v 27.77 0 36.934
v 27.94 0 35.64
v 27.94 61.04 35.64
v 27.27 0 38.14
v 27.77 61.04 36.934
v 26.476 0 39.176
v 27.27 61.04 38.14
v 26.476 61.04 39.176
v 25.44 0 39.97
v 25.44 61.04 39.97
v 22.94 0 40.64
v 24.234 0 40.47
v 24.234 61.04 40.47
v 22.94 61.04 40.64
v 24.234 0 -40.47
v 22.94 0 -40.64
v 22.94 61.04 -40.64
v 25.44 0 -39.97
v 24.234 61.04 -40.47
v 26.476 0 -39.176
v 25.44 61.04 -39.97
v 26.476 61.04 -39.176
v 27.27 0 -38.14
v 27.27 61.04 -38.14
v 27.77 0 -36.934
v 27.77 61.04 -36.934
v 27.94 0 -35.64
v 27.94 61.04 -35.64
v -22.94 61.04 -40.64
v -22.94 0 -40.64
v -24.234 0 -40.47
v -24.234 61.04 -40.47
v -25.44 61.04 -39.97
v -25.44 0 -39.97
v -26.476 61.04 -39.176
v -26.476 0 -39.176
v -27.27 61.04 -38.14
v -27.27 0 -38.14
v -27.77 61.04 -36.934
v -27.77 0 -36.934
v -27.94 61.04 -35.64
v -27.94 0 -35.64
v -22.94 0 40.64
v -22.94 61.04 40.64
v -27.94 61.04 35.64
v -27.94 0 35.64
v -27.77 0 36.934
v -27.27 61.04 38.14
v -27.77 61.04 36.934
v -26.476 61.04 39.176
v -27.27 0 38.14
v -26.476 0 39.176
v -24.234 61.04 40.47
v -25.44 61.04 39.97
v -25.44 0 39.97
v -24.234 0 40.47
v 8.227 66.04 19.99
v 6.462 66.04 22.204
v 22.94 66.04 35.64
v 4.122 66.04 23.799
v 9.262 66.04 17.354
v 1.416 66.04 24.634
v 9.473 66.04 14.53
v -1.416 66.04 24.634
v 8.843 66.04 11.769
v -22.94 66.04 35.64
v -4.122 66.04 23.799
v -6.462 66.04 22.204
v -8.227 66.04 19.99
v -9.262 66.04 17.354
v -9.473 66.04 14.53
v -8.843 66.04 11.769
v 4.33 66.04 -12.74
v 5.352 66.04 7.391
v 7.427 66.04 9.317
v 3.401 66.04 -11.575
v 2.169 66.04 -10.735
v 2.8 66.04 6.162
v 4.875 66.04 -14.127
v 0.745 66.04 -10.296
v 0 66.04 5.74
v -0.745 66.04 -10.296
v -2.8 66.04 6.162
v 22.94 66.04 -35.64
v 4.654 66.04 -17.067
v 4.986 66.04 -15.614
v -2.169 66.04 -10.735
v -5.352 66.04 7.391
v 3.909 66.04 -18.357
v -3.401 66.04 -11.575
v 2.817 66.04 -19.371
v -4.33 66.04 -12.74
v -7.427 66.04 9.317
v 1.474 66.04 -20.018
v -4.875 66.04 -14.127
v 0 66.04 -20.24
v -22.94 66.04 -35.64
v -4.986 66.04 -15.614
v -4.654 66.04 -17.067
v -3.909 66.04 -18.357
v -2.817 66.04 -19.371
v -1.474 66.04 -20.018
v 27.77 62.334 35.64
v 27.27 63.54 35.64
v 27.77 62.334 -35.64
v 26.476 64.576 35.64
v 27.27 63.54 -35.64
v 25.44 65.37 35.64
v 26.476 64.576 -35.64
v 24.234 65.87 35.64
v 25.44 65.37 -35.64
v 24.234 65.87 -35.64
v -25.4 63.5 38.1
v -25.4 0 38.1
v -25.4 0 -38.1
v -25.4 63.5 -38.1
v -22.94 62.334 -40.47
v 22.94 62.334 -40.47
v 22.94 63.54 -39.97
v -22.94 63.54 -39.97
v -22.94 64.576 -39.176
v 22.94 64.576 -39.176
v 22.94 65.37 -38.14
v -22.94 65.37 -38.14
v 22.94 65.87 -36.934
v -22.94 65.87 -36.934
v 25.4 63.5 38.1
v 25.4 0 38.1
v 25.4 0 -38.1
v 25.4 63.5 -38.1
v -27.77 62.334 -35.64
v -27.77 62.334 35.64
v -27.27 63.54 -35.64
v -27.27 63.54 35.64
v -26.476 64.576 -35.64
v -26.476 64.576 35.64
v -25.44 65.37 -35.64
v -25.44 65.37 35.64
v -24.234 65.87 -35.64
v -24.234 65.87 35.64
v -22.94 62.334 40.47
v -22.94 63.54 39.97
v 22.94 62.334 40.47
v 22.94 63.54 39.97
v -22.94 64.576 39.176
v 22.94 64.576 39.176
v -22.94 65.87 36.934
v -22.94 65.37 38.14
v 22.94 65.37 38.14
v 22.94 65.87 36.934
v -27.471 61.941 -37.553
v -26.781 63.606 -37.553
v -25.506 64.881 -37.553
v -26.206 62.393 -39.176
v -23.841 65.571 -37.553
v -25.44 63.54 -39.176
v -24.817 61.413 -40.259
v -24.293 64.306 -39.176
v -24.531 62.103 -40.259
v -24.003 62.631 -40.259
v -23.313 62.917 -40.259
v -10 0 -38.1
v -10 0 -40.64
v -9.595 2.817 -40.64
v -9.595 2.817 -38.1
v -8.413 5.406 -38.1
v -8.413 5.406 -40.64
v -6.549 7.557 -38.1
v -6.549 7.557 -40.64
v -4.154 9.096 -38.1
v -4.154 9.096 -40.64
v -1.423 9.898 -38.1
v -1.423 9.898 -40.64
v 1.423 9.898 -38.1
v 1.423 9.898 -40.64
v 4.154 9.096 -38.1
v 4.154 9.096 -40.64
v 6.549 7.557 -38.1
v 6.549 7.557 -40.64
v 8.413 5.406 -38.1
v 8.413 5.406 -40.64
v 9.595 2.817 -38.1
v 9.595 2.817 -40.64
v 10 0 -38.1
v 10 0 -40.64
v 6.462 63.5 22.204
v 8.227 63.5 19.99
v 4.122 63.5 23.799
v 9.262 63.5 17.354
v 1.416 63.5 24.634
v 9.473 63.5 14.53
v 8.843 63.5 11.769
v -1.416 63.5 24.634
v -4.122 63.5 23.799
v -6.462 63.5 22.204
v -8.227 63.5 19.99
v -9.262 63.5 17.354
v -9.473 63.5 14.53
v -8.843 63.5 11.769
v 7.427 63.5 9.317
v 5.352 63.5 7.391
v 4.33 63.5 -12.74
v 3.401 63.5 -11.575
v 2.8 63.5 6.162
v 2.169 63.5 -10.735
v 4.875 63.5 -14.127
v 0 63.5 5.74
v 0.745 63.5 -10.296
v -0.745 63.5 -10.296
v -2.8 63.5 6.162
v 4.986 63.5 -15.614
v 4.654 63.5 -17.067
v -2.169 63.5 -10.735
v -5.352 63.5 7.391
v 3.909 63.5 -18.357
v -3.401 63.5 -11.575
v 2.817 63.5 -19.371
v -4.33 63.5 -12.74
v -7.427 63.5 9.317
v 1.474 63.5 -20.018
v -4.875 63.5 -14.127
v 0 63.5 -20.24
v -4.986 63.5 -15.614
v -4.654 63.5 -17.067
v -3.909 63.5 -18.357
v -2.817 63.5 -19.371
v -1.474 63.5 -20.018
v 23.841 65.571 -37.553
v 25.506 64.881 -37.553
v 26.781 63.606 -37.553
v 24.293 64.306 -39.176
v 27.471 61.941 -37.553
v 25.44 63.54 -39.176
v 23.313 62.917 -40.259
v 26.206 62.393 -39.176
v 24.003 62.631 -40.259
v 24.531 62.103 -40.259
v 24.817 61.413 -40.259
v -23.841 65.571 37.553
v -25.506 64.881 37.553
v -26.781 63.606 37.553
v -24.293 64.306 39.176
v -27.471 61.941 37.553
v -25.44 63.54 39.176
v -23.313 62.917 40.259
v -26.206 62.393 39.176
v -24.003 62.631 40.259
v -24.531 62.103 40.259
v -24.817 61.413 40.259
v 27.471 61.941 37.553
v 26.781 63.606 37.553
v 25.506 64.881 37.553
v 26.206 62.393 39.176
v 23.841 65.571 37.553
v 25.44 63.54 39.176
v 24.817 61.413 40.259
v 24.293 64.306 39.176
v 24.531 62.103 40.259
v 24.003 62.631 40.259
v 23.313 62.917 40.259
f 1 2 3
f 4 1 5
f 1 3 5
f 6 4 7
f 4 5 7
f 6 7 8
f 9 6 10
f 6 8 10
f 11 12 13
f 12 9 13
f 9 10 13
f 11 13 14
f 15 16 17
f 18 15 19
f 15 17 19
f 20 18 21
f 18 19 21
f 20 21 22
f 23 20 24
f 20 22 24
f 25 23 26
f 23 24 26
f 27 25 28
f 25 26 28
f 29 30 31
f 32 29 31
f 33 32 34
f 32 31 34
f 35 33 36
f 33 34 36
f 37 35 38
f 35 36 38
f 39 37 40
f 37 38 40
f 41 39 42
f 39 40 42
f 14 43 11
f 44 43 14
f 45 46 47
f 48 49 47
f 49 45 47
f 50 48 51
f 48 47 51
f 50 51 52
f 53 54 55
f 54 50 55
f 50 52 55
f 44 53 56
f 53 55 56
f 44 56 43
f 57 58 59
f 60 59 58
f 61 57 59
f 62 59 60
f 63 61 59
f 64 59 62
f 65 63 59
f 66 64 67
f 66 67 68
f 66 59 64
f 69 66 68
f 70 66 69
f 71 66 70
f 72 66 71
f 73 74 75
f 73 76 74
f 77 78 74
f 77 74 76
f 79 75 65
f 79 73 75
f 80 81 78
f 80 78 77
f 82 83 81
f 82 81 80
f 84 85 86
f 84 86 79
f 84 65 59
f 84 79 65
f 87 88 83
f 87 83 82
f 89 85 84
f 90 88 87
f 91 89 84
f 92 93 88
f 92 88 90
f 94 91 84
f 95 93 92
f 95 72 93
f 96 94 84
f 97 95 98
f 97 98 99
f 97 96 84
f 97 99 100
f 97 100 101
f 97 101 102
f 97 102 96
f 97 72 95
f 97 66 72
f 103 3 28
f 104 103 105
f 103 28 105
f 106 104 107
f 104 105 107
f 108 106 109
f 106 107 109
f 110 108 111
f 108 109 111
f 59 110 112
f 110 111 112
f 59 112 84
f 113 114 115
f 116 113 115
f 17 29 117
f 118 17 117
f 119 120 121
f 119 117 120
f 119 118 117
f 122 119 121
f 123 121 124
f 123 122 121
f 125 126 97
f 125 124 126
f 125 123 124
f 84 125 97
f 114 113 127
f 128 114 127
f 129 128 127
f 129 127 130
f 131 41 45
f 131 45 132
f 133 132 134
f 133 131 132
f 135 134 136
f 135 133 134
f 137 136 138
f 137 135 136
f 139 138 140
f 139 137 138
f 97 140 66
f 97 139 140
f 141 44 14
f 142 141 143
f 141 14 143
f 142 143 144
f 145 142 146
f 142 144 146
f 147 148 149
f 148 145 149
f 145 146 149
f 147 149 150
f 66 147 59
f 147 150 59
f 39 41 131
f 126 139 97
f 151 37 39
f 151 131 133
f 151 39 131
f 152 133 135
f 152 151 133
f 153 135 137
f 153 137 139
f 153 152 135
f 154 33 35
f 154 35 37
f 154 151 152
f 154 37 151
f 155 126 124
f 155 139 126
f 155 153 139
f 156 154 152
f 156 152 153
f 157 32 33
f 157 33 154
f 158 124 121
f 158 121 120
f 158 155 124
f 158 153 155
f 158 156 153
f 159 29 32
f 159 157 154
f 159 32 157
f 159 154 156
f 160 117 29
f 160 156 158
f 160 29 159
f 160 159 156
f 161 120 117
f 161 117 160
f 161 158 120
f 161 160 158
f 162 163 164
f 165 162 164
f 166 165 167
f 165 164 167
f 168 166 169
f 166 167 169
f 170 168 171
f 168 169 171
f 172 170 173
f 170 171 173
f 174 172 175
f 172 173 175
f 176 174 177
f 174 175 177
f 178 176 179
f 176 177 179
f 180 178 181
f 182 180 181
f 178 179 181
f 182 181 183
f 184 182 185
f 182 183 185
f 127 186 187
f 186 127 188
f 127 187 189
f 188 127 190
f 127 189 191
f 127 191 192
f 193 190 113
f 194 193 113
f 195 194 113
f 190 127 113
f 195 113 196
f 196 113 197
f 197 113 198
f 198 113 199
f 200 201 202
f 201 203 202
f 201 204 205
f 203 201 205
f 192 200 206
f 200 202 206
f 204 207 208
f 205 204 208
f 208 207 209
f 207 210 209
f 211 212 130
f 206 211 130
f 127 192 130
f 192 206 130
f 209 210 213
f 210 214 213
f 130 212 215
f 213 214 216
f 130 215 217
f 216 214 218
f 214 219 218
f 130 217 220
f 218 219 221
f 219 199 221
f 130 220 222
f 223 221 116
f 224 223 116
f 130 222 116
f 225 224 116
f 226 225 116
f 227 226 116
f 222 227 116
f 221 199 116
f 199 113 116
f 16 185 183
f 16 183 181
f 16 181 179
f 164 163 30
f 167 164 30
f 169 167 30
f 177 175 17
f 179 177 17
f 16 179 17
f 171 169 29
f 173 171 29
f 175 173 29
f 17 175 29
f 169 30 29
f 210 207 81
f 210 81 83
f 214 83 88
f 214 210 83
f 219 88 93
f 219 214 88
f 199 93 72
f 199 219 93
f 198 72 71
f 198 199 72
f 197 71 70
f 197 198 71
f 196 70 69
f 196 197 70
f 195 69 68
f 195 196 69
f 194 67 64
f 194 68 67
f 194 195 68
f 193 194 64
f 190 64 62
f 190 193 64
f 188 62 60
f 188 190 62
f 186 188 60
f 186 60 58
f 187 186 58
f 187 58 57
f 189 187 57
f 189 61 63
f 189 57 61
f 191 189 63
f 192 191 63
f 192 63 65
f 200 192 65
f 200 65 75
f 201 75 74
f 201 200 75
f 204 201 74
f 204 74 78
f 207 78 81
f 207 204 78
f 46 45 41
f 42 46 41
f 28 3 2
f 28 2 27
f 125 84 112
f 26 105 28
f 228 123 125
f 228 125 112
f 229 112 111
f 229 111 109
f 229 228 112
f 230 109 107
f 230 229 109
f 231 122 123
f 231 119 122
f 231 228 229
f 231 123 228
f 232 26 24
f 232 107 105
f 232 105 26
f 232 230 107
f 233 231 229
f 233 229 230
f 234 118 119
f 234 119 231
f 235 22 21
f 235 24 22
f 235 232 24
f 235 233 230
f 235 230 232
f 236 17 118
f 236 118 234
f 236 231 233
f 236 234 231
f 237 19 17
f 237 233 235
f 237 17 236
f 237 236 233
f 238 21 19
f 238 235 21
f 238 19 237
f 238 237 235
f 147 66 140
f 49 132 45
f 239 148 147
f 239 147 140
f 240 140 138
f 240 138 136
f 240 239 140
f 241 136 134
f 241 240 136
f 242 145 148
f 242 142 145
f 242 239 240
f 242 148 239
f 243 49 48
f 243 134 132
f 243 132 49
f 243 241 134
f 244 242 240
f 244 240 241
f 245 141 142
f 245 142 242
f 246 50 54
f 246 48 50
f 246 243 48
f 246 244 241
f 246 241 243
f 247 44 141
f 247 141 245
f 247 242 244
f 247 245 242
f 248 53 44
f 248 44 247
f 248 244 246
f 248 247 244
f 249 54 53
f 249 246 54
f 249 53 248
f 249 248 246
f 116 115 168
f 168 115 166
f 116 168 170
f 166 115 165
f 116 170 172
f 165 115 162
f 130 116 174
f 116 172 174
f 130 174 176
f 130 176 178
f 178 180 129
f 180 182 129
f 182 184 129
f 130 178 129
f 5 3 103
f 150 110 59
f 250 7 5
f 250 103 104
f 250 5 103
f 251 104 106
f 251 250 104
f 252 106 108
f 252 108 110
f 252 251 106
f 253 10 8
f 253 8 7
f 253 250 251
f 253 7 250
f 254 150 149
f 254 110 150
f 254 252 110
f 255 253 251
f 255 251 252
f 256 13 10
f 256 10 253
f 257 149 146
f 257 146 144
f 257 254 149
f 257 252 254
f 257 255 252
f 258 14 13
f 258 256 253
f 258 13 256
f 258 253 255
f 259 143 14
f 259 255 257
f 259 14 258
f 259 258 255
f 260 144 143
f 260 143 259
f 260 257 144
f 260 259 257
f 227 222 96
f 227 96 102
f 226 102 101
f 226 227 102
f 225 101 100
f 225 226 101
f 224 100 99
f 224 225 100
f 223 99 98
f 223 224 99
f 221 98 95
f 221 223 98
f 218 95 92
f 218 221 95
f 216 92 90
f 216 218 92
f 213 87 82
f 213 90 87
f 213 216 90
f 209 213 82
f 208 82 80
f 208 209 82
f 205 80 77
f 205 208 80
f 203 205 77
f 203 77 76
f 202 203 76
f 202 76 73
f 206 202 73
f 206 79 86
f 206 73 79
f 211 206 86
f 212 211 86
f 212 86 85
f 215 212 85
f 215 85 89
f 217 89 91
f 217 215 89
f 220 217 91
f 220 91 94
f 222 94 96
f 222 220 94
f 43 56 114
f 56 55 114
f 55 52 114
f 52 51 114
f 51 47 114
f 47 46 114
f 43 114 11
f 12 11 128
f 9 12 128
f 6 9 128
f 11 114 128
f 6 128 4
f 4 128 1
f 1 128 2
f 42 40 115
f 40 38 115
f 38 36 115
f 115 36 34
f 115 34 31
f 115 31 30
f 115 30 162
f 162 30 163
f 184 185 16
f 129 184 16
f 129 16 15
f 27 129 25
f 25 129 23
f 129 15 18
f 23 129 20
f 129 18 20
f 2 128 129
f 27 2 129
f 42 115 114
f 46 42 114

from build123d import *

# Parameters (mm, degrees)
SKETCH2_W                = 55.88
SKETCH2_H                = 81.28
SKETCH2_W_2              = 50.8
SKETCH2_H_2              = 76.2
BOSS_EXTRUDE1_DEPTH      = 63.5
BOSS_EXTRUDE2_DEPTH      = 27.94
BOSS_EXTRUDE2_DEPTH_BACK = 27.94
SKETCH3_W                = 81.28
SKETCH3_H                = 2.54
FILLET1_R                = 5
FILLET4_R                = 5
FILLET5_R                = 5
FILLET6_R                = 5
FILLET7_R                = 5
CUT_EXTRUDE1_REACH       = 84.423
SKETCH4_R                = 5
SKETCH4_R_2              = 9.5
CUT_EXTRUDE2_REACH       = 110.39
SKETCH6_R                = 10


with BuildPart() as part:
    # Sketch2 → Boss-Extrude1 (new body)
    with BuildSketch(Plane(origin=(0, 0, 0), x_dir=(1, 0, 0), z_dir=(0, 1, 0))):
        Rectangle(SKETCH2_W, SKETCH2_H)
        Rectangle(SKETCH2_W_2, SKETCH2_H_2, mode=Mode.SUBTRACT)
    extrude(amount=BOSS_EXTRUDE1_DEPTH)

    # Sketch3 → Boss-Extrude2 (add, two sides: drawn at the far end of the back side and taken through both)
    with BuildSketch(Plane(origin=(0, 0, 0), x_dir=(0, 0, -1), z_dir=(1, 0, 0)).offset(-BOSS_EXTRUDE2_DEPTH_BACK)):
        with Locations((0, 64.77)):
            Rectangle(SKETCH3_W, SKETCH3_H)
    extrude(amount=BOSS_EXTRUDE2_DEPTH + BOSS_EXTRUDE2_DEPTH_BACK)

    # Fillet1
    fillet1_edges = [part.edges().sort_by_distance(p)[0] for p in [
        (0, 66.04, 40.64),
        (0, 66.04, -40.64),
        (-27.94, 66.04, 0),
        (27.94, 66.04, 0),
    ]]
    fillet(fillet1_edges, radius=FILLET1_R)

    # Fillet4
    # the kernel refuses this fillet: 5 mm, written as the material it takes off along each edge
    with BuildSketch(Plane(origin=(-22.94, 61.04, -35.64), x_dir=(-1, 0, 0), z_dir=(0, 0, -1))) as fillet4_piece_1_section:
        Polygon((0, 0), (FILLET4_R, 0), (FILLET4_R, FILLET4_R), (0, FILLET4_R), align=None)
    fillet4_piece_1 = extrude(amount=FILLET4_R, mode=Mode.PRIVATE)
    fillet4_piece_1 = fillet4_piece_1 - Plane(origin=(-22.94, 61.04, -35.64), x_dir=(0.7071067811865475, -0.7071067811865475, 0), z_dir=(0, 0, -1)) * Sphere(FILLET4_R, mode=Mode.PRIVATE)
    add(fillet4_piece_1, mode=Mode.SUBTRACT)
    with BuildSketch(Plane(origin=(-27.94, -12.5, -40.64), x_dir=(1, 0, 0), z_dir=(0, 1, 0))) as fillet4_piece_2:
        with BuildLine():
            CenterArc((FILLET4_R, -FILLET4_R), FILLET4_R, 90, 90)
            Line((0, -FILLET4_R), (0, 0))
            Line((0, 0), (FILLET4_R, 0))
        make_face()
    extrude(amount=73.54, mode=Mode.SUBTRACT)

    # Fillet5
    # the kernel refuses this fillet: 5 mm, written as the material it takes off along each edge
    with BuildSketch(Plane(origin=(22.94, 61.04, -35.64), x_dir=(1, 0, 0), z_dir=(0, 0, -1))) as fillet5_piece_1_section:
        Polygon((0, 0), (FILLET5_R, 0), (FILLET5_R, -FILLET5_R), (0, -FILLET5_R), align=None)
    fillet5_piece_1 = extrude(amount=FILLET5_R, mode=Mode.PRIVATE)
    fillet5_piece_1 = fillet5_piece_1 - Plane(origin=(22.94, 61.04, -35.64), x_dir=(-0.7071067811865475, -0.7071067811865475, 0), z_dir=(0, 0, -1)) * Sphere(FILLET5_R, mode=Mode.PRIVATE)
    add(fillet5_piece_1, mode=Mode.SUBTRACT)
    with BuildSketch(Plane(origin=(27.94, 61.04, -40.64), x_dir=(-1, 0, 0), z_dir=(0, -1, 0))) as fillet5_piece_2:
        with BuildLine():
            CenterArc((FILLET5_R, -FILLET5_R), FILLET5_R, 90, 90)
            Line((0, -FILLET5_R), (0, 0))
            Line((0, 0), (FILLET5_R, 0))
        make_face()
    extrude(amount=73.54, mode=Mode.SUBTRACT)

    # Fillet6
    # the kernel refuses this fillet: 5 mm, written as the material it takes off along each edge
    with BuildSketch(Plane(origin=(22.94, 61.04, 35.64), x_dir=(1, 0, 0), z_dir=(0, 0, 1))) as fillet6_piece_1_section:
        Polygon((0, 0), (FILLET6_R, 0), (FILLET6_R, FILLET6_R), (0, FILLET6_R), align=None)
    fillet6_piece_1 = extrude(amount=FILLET6_R, mode=Mode.PRIVATE)
    fillet6_piece_1 = fillet6_piece_1 - Plane(origin=(22.94, 61.04, 35.64), x_dir=(-0.7071067811865475, -0.7071067811865475, 0), z_dir=(0, 0, 1)) * Sphere(FILLET6_R, mode=Mode.PRIVATE)
    add(fillet6_piece_1, mode=Mode.SUBTRACT)
    with BuildSketch(Plane(origin=(27.94, 61.04, 40.64), x_dir=(-1, 0, 0), z_dir=(0, -1, 0))) as fillet6_piece_2:
        with BuildLine():
            CenterArc((FILLET6_R, FILLET6_R), FILLET6_R, 180, 90)
            Line((0, FILLET6_R), (0, 0))
            Line((0, 0), (FILLET6_R, 0))
        make_face()
    extrude(amount=73.54, mode=Mode.SUBTRACT)

    # Fillet7
    # the kernel refuses this fillet: 5 mm, written as the material it takes off along each edge
    with BuildSketch(Plane(origin=(-22.94, 61.04, 35.64), x_dir=(-1, 0, 0), z_dir=(0, 0, 1))) as fillet7_piece_1_section:
        Polygon((0, 0), (FILLET7_R, 0), (FILLET7_R, -FILLET7_R), (0, -FILLET7_R), align=None)
    fillet7_piece_1 = extrude(amount=FILLET7_R, mode=Mode.PRIVATE)
    fillet7_piece_1 = fillet7_piece_1 - Plane(origin=(-22.94, 61.04, 35.64), x_dir=(0.7071067811865475, -0.7071067811865475, 0), z_dir=(0, 0, 1)) * Sphere(FILLET7_R, mode=Mode.PRIVATE)
    add(fillet7_piece_1, mode=Mode.SUBTRACT)
    with BuildSketch(Plane(origin=(-27.94, -12.5, 40.64), x_dir=(1, 0, 0), z_dir=(0, 1, 0))) as fillet7_piece_2:
        with BuildLine():
            CenterArc((FILLET7_R, FILLET7_R), FILLET7_R, 180, 90)
            Line((0, FILLET7_R), (0, 0))
            Line((0, 0), (FILLET7_R, 0))
        make_face()
    extrude(amount=73.54, mode=Mode.SUBTRACT)

    # Sketch4 → Cut-Extrude1 (cut, up to next)
    with BuildSketch(Plane(origin=(0, 0, 0), x_dir=(1, 0, 0), z_dir=(0, 1, 0)), mode=Mode.PRIVATE) as cut_extrude1_sk1:
        with Locations(Location((0, 15.24, 0), (0, 0, 90))):
            Circle(SKETCH4_R)
    cut_extrude1_tool1 = extrude(cut_extrude1_sk1.sketch, amount=CUT_EXTRUDE1_REACH, mode=Mode.PRIVATE) & part.part
    # Sketch4 → Cut-Extrude1 (cut, up to next)
    with BuildSketch(Plane(origin=(0, 0, 0), x_dir=(1, 0, 0), z_dir=(0, 1, 0)), mode=Mode.PRIVATE) as cut_extrude1_sk2:
        with Locations(Location((0, -15.24, 0), (0, 0, 90))):
            Circle(SKETCH4_R_2)
    cut_extrude1_tool2 = extrude(cut_extrude1_sk2.sketch, amount=CUT_EXTRUDE1_REACH, mode=Mode.PRIVATE) & part.part
    add(cut_extrude1_tool1.solids().sort_by_distance((0, 0, -15.24))[0], mode=Mode.SUBTRACT)
    add(cut_extrude1_tool2.solids().sort_by_distance((0, 0, 15.24))[0], mode=Mode.SUBTRACT)

    # Sketch6 → Cut-Extrude2 (cut, up to next)
    with BuildSketch(Plane(origin=(0, 0, -40.64), x_dir=(-1, 0, 0), z_dir=(0, 0, -1)), mode=Mode.PRIVATE) as cut_extrude2_sk1:
        Circle(SKETCH6_R)
    cut_extrude2_tool1 = extrude(cut_extrude2_sk1.sketch, amount=-CUT_EXTRUDE2_REACH, mode=Mode.PRIVATE) & part.part
    add(cut_extrude2_tool1.solids().sort_by_distance((0, 0, -40.64))[0], mode=Mode.SUBTRACT)


solid = part.part
